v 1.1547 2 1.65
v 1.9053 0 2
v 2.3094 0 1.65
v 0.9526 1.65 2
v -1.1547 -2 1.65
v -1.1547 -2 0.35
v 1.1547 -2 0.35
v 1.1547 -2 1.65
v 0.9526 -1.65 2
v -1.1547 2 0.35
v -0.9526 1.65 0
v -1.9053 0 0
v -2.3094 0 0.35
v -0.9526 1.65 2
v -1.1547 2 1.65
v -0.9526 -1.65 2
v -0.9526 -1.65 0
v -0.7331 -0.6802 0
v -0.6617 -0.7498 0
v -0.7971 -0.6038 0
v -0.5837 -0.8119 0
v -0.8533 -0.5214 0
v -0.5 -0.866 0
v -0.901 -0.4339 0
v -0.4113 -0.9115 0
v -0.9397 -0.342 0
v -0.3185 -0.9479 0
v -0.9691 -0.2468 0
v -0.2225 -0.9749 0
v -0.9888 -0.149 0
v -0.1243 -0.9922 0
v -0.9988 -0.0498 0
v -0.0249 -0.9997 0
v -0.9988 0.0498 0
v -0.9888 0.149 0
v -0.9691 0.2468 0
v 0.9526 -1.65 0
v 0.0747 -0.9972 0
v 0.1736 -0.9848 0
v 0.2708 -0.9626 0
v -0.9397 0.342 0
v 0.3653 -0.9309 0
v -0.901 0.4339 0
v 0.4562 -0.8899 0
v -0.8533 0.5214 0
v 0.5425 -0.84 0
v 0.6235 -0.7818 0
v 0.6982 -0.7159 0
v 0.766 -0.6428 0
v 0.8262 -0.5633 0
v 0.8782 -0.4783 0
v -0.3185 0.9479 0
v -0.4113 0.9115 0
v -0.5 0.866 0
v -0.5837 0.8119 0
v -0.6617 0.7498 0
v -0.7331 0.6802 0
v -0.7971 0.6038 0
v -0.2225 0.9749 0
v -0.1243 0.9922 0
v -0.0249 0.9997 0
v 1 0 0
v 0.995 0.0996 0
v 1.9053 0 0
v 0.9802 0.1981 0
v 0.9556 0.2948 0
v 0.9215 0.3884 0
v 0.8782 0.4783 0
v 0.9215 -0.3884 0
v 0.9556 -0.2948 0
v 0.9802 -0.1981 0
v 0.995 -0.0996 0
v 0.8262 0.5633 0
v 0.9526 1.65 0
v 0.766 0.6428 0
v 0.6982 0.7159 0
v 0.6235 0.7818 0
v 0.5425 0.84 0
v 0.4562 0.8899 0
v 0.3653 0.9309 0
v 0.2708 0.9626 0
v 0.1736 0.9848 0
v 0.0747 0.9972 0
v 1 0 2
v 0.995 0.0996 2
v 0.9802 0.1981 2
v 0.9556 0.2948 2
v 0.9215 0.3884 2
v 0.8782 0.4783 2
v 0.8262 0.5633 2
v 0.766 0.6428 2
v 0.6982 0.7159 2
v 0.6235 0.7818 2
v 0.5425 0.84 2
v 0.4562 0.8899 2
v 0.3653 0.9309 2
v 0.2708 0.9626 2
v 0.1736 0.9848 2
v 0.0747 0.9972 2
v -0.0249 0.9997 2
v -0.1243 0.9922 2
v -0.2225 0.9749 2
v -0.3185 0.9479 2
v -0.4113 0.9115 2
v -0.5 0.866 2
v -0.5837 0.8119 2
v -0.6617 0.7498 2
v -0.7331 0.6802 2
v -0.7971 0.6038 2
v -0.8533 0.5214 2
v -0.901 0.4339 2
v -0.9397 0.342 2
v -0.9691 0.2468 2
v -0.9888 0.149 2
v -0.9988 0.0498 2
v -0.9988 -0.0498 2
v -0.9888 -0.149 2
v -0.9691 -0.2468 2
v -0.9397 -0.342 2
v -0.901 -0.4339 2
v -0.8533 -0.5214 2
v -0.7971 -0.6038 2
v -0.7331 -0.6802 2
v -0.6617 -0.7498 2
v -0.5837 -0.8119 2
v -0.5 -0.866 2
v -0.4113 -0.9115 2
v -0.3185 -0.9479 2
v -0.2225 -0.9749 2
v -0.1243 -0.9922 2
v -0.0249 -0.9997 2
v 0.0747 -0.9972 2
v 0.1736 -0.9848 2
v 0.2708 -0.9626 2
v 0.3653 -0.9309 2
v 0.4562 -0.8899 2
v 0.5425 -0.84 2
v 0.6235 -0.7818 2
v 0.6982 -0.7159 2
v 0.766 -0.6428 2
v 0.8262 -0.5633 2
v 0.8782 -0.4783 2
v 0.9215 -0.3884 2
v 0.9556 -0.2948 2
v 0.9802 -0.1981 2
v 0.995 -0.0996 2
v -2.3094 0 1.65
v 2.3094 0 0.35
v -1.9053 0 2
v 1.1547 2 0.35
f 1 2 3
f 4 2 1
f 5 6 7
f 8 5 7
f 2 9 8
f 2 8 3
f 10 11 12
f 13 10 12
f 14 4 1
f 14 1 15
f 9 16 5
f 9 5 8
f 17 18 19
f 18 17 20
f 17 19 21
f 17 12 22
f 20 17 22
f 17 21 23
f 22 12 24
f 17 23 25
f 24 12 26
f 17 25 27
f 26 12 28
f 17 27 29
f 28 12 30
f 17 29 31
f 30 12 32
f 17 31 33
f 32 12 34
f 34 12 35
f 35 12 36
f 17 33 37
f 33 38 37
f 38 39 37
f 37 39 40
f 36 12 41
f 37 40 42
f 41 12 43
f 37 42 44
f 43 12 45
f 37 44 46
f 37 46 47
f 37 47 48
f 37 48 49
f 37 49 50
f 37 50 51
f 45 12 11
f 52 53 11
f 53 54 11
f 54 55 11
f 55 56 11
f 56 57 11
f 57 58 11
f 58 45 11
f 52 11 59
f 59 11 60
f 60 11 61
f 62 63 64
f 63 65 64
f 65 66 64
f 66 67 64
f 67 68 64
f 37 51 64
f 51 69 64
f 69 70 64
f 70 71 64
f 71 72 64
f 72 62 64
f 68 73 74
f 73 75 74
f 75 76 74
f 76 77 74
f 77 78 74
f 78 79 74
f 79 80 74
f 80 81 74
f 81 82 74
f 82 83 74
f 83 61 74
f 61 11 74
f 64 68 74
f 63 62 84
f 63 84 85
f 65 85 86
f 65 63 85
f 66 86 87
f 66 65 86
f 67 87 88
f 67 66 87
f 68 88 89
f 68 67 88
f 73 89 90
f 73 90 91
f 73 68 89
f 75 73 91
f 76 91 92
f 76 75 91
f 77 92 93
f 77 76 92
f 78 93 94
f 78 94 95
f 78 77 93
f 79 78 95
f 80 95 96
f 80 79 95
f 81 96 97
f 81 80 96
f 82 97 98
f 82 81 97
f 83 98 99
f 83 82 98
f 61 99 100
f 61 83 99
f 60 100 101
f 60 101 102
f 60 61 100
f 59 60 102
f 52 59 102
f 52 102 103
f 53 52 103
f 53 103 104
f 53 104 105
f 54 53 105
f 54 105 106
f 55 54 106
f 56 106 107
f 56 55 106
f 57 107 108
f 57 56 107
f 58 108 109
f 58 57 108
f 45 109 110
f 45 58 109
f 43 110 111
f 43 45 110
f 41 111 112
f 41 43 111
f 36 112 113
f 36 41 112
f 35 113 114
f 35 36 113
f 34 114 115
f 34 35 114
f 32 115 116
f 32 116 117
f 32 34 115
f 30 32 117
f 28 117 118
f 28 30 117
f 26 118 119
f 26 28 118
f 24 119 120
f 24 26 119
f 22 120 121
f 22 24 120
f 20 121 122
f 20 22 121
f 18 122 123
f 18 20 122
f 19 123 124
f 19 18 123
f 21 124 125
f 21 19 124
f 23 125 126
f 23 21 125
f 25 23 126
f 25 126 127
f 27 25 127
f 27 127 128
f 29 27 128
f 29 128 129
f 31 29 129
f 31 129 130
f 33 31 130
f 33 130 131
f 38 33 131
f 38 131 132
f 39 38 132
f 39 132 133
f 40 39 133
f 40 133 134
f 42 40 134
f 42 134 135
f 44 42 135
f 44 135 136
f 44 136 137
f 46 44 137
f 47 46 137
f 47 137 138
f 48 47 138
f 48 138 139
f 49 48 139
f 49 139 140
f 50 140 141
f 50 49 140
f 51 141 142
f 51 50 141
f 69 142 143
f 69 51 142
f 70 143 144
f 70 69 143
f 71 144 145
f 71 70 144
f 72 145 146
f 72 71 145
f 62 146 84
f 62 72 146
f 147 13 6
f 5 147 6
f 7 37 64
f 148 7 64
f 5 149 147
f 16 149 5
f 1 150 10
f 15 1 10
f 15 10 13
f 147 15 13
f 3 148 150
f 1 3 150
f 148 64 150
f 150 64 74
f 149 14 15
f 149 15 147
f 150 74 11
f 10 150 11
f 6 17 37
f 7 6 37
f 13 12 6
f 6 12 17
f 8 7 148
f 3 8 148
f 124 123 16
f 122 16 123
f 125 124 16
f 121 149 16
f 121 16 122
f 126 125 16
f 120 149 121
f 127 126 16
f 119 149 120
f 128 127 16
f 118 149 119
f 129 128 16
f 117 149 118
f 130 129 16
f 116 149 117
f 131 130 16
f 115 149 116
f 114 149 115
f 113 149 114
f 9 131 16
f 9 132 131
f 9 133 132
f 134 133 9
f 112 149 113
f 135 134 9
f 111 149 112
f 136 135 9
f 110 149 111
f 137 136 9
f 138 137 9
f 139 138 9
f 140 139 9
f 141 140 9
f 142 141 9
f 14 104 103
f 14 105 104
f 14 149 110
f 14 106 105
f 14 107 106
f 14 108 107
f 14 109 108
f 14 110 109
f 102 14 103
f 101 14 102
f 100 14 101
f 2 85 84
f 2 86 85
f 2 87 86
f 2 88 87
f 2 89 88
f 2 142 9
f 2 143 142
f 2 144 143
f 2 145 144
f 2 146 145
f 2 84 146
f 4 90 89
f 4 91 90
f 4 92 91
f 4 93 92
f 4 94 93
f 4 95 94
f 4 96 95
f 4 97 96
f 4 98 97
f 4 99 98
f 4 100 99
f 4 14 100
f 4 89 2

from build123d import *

# Parameters (mm, degrees)
SKETCH1_R      = 1
SHAPE_DEPTH    = 2
CHAMFER_2_SIZE = 0.35


with BuildPart() as part:
    # Sketch1 → Shape (new body)
    with BuildSketch(Plane.XY):
        Polygon((-1.154700538, -2), (1.154700538, -2), (2.309401077, 0), (1.154700538, 2), (-1.154700538, 2), (-2.309401077, 0), align=None)
        Circle(SKETCH1_R, mode=Mode.SUBTRACT)
    extrude(amount=SHAPE_DEPTH)

    # Chamfer 2
    chamfer_2_edges = [part.edges().sort_by_distance(p)[0] for p in [
        (1.732050808, -1, 2),
        (1.732050808, 1, 2),
        (0, 2, 2),
        (-1.732050808, 1, 2),
        (-1.732050808, -1, 2),
        (-1.732050808, 1, 0),
        (0, 2, 0),
        (1.732050808, 1, 0),
        (0, -2, 2),
        (1.732050808, -1, 0),
        (0, -2, 0),
        (-1.732050808, -1, 0),
    ]]
    chamfer(chamfer_2_edges, length=CHAMFER_2_SIZE)


solid = part.part
